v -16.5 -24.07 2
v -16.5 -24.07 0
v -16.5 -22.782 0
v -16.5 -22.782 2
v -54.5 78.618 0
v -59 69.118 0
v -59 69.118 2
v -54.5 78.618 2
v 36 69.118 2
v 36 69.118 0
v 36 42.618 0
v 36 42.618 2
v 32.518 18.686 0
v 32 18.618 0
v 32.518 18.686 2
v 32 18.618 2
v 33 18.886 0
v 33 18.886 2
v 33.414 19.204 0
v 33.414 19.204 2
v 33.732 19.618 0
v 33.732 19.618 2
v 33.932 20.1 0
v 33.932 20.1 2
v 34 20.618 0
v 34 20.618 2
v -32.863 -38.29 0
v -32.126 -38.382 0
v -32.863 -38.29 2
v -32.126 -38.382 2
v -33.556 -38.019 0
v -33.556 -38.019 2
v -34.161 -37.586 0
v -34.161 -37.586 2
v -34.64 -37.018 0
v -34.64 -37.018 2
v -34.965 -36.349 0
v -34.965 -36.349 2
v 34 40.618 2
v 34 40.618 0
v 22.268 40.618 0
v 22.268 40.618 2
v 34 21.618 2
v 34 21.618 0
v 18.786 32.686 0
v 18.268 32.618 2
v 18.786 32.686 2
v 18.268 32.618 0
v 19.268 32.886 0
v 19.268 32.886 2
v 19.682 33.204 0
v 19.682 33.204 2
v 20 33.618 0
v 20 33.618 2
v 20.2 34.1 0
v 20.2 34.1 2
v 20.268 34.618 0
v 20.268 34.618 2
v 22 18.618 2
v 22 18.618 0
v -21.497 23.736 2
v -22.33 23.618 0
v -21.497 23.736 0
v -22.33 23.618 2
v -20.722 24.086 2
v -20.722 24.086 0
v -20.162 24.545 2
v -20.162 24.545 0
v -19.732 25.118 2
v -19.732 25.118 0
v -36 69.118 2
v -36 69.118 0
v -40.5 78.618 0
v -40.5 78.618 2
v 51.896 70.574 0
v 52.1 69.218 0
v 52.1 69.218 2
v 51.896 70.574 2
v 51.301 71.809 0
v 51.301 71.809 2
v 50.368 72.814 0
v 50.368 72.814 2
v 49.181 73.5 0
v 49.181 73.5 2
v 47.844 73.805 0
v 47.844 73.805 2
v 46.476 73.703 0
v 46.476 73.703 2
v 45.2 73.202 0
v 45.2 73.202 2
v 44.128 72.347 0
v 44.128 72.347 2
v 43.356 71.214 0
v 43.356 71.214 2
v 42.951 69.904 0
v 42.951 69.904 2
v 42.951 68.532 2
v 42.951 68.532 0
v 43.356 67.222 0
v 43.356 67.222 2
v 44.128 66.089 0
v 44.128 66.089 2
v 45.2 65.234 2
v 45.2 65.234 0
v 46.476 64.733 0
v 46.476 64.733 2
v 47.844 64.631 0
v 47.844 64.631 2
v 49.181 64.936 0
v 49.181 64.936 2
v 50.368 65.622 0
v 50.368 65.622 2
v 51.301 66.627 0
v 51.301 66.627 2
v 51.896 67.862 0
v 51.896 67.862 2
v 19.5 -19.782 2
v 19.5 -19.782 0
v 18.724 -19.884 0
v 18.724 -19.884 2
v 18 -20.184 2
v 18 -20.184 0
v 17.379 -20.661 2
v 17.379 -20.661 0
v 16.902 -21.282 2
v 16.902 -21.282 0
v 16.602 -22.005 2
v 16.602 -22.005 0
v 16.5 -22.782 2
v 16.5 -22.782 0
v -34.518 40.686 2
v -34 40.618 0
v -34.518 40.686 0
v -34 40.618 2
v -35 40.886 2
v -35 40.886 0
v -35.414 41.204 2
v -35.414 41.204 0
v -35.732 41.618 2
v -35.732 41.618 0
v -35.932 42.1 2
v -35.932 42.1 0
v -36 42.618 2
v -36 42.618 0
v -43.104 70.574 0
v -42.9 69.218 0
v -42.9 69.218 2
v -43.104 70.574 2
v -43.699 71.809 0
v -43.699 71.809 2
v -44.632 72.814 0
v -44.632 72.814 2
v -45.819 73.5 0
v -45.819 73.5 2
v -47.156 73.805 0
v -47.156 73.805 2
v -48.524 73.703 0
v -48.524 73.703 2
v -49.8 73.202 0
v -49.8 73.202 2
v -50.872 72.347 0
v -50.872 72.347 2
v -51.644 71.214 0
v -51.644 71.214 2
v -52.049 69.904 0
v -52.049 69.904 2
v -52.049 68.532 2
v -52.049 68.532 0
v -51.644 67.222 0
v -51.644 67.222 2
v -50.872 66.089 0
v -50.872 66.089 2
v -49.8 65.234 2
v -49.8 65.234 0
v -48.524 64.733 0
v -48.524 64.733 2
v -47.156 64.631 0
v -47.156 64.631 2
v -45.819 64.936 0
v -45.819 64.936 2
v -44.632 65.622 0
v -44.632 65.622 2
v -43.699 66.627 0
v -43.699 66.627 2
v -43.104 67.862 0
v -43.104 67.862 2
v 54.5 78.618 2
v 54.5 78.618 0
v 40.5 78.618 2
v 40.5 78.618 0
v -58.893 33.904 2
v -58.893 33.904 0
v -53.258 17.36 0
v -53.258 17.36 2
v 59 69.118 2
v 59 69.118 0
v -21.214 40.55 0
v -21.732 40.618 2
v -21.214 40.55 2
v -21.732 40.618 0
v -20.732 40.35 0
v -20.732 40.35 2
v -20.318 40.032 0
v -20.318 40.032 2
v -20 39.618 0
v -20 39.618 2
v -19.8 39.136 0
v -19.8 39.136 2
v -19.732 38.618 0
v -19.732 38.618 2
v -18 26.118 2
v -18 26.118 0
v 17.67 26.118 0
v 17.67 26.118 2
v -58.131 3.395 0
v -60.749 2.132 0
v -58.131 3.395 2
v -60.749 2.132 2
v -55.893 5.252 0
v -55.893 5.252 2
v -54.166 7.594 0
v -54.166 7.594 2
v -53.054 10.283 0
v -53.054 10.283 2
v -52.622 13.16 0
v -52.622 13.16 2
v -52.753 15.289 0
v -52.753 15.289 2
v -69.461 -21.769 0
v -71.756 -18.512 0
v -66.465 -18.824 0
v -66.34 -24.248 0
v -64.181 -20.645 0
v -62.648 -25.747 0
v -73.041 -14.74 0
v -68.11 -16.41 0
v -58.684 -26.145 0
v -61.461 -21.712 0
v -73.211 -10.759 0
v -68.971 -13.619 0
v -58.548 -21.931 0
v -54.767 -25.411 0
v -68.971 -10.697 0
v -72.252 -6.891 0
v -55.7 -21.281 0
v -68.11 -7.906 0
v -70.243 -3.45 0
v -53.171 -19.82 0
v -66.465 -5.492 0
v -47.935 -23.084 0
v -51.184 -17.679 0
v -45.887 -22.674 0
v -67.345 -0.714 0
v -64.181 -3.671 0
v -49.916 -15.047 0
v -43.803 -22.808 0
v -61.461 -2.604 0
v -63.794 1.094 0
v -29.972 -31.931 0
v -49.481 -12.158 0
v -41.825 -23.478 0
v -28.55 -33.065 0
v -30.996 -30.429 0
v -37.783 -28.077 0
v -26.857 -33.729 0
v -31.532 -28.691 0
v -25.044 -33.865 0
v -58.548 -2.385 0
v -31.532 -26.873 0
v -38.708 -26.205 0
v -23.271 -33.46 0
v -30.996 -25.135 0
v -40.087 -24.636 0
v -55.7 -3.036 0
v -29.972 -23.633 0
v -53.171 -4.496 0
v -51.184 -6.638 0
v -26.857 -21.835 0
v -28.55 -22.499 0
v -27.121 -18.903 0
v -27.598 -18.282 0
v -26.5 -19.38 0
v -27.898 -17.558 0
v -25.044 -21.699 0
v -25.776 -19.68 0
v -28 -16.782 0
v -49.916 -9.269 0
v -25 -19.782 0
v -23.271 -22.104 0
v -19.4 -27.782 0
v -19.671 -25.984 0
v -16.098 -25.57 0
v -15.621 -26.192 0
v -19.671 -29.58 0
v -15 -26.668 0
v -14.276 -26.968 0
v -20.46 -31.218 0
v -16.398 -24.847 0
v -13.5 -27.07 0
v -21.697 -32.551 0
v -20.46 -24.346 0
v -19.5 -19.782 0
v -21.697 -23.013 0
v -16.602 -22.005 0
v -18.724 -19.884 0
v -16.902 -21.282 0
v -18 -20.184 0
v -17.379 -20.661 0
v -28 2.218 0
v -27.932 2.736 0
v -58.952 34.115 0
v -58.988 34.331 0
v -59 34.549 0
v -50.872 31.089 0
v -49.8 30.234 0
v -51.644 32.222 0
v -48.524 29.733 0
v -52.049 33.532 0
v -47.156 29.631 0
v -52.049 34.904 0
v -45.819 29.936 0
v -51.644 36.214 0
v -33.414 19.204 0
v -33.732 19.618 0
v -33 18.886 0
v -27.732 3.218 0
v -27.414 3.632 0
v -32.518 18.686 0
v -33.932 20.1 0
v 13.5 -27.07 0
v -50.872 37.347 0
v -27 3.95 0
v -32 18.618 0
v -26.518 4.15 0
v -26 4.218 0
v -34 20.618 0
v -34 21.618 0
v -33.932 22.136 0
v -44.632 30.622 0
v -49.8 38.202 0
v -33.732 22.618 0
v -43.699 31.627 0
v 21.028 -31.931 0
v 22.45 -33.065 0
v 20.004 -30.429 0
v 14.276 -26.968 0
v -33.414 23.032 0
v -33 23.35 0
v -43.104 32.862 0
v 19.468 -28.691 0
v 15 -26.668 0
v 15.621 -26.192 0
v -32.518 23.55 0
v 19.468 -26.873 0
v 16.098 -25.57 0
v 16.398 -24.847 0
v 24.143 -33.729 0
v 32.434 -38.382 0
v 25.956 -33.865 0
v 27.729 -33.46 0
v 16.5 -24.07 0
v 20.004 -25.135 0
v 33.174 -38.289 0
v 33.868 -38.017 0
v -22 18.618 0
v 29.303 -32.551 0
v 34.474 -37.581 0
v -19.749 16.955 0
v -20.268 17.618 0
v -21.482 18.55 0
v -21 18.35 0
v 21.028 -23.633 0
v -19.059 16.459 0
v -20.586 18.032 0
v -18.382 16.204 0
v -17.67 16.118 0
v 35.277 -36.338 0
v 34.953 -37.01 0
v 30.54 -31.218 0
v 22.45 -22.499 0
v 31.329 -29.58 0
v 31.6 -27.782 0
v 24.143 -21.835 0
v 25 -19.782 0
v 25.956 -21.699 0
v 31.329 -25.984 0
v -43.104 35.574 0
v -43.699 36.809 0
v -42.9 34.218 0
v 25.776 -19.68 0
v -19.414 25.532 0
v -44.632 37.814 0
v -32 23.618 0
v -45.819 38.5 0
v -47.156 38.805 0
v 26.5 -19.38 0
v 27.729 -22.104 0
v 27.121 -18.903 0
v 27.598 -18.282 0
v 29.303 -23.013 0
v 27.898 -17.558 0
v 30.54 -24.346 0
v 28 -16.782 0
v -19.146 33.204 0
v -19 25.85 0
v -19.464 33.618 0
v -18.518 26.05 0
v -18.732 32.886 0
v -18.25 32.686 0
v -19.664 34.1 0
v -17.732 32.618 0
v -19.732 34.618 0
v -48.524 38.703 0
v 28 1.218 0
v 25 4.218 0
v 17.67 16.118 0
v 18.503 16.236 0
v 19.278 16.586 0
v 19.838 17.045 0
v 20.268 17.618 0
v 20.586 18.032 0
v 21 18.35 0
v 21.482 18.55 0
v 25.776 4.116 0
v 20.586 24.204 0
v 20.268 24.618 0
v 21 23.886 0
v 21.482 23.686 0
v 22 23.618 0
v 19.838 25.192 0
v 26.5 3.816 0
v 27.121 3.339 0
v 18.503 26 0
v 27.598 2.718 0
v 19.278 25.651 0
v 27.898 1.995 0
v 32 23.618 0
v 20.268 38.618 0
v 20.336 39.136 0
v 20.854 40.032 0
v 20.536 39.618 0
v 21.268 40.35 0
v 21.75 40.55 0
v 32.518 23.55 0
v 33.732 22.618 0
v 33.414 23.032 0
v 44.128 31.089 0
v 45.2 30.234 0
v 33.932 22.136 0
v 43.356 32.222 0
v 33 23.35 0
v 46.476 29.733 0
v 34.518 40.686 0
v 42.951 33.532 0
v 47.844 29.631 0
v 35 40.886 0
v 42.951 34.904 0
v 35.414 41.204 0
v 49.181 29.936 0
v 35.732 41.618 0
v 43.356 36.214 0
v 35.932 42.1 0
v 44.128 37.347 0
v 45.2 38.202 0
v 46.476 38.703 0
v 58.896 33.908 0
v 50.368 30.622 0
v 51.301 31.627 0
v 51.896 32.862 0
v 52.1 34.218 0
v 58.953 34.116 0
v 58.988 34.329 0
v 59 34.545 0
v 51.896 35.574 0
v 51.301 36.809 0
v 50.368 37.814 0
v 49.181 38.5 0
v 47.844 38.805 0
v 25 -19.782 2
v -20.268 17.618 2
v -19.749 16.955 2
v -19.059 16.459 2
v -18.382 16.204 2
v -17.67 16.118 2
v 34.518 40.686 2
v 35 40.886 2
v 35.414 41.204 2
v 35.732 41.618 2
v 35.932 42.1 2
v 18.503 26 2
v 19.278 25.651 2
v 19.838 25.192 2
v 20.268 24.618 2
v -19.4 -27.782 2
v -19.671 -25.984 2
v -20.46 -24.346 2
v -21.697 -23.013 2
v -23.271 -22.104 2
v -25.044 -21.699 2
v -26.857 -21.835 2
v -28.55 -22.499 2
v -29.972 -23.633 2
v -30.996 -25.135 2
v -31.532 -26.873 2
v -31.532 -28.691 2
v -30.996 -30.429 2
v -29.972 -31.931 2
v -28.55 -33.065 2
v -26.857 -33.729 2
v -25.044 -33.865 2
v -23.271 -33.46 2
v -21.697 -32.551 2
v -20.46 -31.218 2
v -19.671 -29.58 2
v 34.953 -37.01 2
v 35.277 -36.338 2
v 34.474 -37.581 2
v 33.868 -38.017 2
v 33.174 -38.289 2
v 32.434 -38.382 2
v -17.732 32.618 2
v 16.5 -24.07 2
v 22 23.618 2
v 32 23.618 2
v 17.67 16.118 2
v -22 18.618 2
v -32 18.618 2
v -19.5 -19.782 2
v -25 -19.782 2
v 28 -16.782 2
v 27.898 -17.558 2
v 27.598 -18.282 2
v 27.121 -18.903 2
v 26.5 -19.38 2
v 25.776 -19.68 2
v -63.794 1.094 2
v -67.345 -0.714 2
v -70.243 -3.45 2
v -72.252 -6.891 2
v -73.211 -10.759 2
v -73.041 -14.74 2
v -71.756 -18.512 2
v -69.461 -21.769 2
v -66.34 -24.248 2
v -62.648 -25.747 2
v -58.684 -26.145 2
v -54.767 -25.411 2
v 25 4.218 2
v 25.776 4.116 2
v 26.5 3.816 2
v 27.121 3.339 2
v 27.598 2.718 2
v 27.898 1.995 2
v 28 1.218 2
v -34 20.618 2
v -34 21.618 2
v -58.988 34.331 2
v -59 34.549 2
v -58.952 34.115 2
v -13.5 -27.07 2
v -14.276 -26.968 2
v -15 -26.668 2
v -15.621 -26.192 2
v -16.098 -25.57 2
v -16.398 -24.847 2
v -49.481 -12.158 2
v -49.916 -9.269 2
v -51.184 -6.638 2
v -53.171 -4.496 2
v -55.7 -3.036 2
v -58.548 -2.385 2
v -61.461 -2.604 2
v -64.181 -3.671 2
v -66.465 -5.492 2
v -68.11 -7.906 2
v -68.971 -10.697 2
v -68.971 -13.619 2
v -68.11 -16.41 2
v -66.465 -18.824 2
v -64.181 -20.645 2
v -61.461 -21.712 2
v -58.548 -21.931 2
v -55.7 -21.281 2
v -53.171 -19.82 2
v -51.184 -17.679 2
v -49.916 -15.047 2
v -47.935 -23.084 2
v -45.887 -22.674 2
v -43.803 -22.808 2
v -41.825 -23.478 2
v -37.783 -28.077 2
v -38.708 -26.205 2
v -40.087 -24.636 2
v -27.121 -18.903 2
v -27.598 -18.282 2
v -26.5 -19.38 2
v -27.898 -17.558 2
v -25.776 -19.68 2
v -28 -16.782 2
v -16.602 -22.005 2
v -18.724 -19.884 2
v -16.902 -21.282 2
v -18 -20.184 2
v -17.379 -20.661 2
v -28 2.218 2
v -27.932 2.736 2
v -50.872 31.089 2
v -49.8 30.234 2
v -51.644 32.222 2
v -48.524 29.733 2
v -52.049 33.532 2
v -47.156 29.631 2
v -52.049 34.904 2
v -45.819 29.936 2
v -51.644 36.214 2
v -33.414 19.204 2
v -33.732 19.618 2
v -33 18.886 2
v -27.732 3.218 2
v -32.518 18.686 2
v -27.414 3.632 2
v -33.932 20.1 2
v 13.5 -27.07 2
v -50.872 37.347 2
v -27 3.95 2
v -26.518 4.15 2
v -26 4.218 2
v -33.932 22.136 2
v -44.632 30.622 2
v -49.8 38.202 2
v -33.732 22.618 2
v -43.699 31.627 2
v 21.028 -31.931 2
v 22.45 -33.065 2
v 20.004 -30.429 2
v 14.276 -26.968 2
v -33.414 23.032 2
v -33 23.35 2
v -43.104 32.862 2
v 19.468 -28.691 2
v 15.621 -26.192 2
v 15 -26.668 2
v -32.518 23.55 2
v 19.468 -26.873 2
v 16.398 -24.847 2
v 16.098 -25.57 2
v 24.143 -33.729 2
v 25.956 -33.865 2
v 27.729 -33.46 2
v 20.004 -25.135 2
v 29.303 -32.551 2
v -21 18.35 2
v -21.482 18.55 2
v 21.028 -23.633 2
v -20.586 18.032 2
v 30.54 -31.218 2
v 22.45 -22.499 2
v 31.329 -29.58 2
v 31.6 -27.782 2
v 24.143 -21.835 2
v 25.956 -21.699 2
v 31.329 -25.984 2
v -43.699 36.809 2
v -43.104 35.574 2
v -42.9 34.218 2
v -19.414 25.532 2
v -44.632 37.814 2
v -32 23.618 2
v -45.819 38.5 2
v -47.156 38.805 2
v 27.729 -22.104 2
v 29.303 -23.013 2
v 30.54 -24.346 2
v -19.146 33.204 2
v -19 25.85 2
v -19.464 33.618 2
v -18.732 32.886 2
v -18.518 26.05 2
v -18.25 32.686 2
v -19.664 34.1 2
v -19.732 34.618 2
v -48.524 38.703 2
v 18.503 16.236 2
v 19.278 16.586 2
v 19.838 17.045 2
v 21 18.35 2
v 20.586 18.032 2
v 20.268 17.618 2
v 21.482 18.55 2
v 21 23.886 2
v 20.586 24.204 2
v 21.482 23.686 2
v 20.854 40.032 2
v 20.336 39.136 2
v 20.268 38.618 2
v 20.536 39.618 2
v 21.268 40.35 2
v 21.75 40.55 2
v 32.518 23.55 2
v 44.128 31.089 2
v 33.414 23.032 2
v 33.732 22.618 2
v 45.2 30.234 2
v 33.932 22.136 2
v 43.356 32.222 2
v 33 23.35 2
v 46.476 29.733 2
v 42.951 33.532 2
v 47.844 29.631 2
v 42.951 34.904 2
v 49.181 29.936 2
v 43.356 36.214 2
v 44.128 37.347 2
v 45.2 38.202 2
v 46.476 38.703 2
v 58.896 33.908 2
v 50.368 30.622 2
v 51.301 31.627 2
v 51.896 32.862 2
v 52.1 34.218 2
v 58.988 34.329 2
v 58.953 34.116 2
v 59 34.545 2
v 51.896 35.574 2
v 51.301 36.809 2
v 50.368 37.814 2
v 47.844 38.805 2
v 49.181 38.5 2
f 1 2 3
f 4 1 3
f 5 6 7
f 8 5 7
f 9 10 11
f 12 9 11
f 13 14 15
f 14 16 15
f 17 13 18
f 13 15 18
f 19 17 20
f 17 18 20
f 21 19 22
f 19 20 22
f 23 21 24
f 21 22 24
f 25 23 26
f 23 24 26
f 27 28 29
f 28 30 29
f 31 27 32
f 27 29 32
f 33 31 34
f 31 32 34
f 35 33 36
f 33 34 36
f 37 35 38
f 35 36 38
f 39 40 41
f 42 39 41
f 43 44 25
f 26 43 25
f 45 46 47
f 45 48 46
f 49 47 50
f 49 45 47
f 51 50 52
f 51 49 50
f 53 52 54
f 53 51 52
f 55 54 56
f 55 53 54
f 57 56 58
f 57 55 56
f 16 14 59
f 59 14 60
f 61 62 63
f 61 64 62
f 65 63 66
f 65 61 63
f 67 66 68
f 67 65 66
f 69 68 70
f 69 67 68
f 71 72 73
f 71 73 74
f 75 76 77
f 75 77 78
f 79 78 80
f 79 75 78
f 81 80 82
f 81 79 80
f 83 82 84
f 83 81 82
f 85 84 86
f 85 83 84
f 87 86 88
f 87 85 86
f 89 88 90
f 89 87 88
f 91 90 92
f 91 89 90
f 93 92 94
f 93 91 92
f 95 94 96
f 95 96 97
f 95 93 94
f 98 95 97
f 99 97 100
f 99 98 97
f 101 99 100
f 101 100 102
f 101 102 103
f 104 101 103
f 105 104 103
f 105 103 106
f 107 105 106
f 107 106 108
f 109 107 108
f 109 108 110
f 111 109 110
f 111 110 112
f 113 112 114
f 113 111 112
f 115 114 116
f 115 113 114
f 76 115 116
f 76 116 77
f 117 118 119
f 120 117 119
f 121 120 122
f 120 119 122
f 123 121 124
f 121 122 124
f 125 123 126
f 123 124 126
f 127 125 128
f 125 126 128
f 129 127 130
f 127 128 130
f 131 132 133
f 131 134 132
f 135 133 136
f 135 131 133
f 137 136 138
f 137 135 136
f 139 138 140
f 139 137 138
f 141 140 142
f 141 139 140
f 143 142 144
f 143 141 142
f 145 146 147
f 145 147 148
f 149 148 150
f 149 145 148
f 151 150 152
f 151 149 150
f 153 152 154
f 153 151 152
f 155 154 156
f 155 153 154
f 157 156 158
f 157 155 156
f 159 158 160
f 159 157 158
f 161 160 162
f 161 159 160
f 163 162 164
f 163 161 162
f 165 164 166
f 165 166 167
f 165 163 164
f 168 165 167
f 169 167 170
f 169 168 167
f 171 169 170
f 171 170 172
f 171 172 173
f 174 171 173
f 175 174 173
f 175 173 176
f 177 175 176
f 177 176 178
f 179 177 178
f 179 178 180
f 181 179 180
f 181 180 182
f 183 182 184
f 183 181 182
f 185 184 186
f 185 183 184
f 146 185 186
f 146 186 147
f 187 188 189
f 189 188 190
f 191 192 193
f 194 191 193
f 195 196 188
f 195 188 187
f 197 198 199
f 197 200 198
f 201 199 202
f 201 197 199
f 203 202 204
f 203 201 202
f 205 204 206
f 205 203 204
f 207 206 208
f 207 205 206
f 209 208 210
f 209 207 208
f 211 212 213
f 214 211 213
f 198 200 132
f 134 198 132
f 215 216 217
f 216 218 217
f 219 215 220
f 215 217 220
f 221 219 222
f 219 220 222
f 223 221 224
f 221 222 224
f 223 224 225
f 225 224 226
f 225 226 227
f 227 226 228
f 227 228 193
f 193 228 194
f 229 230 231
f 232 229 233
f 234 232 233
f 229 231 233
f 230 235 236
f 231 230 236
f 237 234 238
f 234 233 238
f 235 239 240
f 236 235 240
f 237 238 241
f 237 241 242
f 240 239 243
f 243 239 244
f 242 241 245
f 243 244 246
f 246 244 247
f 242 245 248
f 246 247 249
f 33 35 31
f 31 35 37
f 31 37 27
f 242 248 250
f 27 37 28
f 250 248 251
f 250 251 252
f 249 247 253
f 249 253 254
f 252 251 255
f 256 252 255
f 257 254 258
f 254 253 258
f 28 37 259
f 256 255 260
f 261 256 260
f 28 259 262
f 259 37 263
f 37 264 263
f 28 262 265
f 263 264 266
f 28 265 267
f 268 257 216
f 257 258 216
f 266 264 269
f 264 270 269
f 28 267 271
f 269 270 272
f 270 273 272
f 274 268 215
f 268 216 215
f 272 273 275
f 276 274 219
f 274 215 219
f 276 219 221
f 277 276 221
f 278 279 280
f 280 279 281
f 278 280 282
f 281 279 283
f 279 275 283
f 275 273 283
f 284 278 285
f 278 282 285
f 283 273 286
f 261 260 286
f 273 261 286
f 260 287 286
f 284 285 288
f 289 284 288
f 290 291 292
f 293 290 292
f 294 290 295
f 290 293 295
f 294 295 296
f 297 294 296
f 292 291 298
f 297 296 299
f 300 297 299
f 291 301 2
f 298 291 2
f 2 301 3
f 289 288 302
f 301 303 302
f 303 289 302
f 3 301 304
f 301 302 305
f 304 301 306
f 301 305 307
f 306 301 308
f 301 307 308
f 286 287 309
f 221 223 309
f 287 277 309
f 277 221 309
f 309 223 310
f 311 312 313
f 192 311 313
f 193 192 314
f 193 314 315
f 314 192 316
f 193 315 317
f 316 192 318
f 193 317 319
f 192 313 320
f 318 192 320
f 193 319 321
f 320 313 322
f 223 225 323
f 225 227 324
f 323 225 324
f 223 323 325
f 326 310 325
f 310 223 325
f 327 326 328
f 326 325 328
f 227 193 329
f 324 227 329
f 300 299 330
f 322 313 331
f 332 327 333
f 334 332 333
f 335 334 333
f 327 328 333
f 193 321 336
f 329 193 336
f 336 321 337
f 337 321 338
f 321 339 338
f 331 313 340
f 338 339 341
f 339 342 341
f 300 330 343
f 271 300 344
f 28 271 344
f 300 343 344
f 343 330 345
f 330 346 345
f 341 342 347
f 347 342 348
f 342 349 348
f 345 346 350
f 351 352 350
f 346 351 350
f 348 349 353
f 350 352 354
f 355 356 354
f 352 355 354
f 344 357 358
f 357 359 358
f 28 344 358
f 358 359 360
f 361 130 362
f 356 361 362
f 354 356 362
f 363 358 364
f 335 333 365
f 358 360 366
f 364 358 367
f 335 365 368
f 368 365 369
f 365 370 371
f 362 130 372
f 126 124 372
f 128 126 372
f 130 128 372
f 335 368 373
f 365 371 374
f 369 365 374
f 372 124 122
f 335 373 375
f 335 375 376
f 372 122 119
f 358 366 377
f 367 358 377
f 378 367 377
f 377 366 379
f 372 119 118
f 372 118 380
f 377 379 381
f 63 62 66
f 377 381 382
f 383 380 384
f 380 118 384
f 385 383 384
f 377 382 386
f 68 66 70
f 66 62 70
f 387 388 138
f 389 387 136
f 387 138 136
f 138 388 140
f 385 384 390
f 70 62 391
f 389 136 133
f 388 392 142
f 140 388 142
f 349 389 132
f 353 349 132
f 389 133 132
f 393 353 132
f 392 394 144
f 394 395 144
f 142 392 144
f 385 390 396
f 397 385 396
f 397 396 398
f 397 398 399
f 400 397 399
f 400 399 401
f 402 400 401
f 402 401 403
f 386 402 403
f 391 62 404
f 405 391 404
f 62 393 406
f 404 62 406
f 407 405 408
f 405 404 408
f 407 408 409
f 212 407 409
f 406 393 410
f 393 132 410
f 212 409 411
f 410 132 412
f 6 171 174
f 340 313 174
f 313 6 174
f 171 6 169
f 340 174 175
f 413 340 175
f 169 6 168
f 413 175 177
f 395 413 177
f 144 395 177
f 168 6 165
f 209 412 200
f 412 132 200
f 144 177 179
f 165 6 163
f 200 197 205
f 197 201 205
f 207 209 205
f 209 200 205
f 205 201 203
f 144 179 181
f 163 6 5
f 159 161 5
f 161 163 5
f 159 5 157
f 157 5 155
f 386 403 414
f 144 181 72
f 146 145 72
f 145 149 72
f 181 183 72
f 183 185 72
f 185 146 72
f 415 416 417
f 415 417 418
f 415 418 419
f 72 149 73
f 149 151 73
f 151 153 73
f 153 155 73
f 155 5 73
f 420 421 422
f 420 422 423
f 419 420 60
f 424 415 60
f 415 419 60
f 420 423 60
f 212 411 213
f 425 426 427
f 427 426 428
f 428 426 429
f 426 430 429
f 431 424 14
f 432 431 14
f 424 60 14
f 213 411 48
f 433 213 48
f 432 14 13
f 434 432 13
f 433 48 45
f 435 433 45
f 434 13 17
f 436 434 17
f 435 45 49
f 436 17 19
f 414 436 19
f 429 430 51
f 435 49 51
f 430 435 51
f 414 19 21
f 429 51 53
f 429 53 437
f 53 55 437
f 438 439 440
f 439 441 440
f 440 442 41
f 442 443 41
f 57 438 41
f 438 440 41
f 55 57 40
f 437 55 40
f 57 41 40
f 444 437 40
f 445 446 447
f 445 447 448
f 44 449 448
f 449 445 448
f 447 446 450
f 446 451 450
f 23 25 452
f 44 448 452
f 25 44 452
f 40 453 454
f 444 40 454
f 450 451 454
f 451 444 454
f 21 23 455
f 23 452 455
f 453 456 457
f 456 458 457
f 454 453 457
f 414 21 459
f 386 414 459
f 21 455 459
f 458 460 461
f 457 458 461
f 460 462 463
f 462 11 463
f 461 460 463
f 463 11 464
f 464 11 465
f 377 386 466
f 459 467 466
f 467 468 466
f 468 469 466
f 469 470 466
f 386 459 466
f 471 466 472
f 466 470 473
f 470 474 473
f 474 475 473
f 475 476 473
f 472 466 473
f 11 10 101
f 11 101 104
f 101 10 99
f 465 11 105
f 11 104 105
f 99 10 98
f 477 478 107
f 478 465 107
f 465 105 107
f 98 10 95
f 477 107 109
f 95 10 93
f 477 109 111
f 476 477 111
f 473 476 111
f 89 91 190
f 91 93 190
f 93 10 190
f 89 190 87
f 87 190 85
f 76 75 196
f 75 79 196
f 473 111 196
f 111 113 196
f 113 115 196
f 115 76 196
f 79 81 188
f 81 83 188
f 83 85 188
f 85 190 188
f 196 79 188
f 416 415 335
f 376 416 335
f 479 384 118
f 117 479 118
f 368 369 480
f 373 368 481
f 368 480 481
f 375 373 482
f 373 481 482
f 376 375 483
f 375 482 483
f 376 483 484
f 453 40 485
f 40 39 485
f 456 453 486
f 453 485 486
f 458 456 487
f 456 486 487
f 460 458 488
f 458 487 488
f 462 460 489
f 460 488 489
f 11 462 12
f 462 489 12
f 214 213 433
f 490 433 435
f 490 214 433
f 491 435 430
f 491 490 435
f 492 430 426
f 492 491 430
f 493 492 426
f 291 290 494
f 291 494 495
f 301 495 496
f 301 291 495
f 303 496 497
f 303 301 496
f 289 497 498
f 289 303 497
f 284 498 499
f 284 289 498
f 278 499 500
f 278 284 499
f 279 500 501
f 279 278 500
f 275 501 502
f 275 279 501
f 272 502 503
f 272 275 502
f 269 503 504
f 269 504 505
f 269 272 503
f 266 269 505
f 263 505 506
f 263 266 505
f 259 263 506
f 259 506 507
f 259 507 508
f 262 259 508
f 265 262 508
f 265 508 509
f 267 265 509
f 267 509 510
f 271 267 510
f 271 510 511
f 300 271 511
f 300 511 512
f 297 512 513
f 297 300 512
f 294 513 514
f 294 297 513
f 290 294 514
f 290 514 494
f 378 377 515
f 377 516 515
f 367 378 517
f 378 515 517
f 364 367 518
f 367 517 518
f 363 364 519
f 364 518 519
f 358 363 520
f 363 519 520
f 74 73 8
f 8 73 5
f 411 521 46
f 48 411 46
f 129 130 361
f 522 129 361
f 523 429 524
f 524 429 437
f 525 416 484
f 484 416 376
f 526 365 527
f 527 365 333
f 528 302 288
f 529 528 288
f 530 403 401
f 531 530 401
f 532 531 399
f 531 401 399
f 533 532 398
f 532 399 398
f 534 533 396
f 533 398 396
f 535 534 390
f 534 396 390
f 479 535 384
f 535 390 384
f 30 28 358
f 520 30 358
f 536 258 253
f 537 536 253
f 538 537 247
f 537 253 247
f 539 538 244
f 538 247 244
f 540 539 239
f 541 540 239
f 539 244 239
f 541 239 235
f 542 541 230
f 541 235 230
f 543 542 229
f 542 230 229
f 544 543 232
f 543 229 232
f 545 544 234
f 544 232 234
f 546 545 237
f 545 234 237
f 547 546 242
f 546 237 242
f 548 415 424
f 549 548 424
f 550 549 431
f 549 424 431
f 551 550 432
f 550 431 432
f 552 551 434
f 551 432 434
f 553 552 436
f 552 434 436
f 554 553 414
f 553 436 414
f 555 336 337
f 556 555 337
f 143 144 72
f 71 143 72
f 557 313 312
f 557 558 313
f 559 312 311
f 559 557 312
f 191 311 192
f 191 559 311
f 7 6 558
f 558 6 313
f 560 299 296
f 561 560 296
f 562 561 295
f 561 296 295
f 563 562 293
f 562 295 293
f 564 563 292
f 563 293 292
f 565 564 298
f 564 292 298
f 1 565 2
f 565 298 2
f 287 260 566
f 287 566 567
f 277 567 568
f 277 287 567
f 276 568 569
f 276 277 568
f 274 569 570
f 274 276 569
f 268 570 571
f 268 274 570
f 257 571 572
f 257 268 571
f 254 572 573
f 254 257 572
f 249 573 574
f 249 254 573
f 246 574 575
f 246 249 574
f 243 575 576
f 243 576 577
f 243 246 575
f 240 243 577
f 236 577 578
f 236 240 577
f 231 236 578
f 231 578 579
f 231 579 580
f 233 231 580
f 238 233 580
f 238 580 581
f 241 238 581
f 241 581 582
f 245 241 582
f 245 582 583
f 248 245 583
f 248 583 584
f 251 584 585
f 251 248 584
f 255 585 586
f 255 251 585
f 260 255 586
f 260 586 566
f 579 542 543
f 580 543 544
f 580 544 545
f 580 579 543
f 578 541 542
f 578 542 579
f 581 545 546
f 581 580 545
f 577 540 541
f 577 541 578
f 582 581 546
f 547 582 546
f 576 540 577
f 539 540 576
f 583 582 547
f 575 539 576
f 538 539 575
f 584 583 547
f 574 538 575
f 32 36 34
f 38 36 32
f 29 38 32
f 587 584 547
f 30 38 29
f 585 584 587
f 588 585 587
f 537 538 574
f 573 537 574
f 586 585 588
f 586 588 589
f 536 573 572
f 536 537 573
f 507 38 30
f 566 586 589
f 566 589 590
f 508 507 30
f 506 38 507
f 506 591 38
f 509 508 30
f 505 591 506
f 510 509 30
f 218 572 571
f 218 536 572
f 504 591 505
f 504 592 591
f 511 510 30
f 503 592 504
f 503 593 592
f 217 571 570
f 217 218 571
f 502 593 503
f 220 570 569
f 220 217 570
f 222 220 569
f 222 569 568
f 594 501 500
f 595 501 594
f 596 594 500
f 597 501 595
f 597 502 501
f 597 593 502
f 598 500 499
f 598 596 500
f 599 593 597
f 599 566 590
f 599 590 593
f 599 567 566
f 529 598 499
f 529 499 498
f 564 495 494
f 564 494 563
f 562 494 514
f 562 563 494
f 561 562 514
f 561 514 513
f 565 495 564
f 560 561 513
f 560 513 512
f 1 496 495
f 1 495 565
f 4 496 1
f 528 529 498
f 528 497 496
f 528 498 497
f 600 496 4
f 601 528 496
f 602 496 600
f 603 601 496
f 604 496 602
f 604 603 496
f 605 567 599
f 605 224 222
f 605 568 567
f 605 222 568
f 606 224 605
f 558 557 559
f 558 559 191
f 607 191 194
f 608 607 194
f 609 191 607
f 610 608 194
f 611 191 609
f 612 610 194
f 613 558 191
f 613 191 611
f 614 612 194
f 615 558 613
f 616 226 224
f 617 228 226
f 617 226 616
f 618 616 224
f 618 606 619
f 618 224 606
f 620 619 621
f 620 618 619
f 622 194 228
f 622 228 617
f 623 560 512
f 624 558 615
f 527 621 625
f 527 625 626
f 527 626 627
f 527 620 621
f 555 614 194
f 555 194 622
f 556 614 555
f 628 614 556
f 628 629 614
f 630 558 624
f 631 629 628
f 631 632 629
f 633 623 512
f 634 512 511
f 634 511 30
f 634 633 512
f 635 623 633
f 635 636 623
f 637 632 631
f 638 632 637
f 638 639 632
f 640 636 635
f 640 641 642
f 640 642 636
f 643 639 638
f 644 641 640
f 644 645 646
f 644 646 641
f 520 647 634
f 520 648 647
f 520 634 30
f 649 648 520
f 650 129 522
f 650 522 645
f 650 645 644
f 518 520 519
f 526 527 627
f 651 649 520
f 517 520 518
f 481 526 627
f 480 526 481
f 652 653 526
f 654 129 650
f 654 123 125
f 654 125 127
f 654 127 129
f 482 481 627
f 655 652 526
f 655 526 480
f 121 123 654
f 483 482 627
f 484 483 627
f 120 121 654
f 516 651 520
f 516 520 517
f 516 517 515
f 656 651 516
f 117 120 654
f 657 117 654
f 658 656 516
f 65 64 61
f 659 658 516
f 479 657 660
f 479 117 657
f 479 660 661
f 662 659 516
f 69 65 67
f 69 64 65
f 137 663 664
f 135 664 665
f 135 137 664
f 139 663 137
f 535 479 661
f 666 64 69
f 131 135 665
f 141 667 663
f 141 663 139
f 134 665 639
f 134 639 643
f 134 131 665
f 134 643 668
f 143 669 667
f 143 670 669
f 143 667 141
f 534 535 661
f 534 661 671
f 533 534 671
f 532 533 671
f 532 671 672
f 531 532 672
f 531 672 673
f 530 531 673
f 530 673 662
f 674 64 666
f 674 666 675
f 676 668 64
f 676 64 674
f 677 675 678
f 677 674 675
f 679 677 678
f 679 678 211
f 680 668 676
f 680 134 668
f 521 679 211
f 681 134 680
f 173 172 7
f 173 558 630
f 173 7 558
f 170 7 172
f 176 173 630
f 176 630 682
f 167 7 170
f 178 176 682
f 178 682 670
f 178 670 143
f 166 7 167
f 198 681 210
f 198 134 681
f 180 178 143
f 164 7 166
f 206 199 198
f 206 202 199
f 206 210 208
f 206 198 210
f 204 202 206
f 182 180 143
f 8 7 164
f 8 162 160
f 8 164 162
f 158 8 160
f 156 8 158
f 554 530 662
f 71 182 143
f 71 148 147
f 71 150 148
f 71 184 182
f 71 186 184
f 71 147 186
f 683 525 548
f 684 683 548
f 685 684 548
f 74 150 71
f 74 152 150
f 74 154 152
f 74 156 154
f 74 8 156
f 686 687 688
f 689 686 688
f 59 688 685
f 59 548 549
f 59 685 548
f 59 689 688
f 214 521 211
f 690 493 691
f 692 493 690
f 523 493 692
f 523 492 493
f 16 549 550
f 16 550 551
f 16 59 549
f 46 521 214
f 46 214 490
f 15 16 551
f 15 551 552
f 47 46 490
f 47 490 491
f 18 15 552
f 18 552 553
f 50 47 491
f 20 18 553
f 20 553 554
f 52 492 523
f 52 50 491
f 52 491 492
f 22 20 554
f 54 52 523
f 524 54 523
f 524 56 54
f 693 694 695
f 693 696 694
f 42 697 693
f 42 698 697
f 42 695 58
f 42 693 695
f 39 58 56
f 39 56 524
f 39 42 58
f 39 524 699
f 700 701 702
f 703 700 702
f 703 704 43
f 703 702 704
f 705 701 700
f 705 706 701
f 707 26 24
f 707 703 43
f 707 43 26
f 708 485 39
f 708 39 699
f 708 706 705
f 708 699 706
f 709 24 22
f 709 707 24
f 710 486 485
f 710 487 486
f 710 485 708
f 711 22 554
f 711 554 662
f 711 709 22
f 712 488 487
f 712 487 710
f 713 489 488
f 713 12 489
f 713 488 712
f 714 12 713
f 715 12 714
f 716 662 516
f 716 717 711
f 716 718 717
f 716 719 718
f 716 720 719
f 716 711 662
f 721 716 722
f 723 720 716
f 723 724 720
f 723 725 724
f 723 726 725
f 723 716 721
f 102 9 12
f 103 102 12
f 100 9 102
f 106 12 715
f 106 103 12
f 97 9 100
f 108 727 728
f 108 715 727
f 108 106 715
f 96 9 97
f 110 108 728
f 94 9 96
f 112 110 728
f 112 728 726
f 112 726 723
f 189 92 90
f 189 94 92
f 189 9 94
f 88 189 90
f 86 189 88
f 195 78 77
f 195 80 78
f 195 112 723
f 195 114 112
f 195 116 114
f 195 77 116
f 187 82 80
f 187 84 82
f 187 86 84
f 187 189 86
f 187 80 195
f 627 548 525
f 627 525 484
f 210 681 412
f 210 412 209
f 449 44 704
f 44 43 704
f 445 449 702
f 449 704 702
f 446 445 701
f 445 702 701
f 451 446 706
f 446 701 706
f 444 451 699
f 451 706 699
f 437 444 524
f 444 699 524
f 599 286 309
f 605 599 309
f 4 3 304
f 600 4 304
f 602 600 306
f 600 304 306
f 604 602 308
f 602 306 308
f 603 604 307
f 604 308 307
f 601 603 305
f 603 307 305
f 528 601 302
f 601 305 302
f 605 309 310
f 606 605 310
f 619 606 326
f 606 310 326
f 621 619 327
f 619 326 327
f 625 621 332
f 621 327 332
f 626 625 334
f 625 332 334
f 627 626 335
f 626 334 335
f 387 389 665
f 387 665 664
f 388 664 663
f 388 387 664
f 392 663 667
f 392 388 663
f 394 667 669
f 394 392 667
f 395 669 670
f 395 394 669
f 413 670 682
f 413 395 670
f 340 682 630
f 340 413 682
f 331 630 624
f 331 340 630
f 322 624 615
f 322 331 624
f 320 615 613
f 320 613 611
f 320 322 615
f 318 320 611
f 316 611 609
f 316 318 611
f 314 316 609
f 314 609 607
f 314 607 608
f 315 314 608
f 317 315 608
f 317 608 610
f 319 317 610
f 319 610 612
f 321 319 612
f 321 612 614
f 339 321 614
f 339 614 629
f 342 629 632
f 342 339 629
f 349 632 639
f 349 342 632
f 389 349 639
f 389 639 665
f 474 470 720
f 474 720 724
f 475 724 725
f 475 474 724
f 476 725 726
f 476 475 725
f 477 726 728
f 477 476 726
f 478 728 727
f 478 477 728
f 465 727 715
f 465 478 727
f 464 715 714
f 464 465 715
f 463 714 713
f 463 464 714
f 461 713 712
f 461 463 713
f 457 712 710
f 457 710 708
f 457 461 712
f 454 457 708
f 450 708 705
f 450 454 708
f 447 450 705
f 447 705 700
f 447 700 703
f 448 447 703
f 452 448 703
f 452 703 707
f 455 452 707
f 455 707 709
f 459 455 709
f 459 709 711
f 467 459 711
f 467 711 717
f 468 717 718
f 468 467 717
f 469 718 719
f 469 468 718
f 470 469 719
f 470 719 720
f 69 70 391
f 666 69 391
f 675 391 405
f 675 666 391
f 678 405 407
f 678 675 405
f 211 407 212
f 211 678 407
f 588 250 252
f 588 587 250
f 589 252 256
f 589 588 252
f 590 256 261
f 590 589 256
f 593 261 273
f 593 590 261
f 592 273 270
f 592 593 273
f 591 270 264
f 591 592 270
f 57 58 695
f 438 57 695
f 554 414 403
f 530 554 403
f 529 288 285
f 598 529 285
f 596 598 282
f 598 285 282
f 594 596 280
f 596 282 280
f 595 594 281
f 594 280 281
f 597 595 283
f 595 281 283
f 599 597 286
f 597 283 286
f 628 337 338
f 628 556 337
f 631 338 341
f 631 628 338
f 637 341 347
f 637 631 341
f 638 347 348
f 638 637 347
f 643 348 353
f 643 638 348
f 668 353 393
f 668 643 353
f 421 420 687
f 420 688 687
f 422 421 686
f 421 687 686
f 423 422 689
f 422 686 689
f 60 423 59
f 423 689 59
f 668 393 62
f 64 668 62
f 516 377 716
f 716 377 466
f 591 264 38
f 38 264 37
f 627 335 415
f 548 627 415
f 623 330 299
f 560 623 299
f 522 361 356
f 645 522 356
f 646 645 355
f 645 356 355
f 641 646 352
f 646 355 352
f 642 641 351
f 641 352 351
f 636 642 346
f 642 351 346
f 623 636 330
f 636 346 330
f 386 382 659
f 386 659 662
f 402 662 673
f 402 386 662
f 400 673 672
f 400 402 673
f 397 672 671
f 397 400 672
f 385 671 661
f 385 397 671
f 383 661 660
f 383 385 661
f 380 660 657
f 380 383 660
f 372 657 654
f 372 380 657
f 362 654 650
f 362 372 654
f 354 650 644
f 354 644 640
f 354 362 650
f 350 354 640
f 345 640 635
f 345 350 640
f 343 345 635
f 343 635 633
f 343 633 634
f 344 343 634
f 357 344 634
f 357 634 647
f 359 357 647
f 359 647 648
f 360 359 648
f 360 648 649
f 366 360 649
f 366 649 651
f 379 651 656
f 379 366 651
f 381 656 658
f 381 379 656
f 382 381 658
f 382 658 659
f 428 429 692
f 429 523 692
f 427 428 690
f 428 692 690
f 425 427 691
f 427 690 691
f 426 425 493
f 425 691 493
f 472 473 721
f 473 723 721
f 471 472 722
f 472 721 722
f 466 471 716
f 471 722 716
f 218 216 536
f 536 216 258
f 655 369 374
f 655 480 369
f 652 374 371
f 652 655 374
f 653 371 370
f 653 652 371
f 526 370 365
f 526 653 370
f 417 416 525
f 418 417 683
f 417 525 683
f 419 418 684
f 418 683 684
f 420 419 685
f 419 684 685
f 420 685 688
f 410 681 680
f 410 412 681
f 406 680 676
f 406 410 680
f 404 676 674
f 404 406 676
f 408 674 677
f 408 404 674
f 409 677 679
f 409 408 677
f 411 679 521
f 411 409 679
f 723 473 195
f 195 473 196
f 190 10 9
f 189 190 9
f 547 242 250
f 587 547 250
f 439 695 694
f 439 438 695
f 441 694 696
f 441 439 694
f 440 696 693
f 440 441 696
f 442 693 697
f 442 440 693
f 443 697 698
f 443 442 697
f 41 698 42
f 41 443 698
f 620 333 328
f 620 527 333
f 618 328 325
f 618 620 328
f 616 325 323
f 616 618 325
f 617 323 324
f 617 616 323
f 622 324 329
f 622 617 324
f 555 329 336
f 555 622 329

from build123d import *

# Parameters (mm, degrees)
F0_R        = 9.8
F0_R_2      = 6.1
F0_R_3      = 4.6
F1_DEPTH    = 2
F2_R        = 2
F3_R        = 3
F4_W        = 40
F4_H        = 8
F5_DEPTH    = 25
F6_R        = 2
F7_R        = 8
F8_R        = 12
F9_C1_SIZE2 = 4.5
F9_C1_SIZE  = 9.5
F9_C2_SIZE2 = 9.5
F9_C2_SIZE  = 4.5
F9_C3_SIZE2 = 9.5
F9_C3_SIZE  = 4.5
F9_C4_SIZE2 = 9.5
F9_C4_SIZE  = 4.5


# Not quite as in the source:
# - two fillets or chamfers of one size are made in one step


with BuildPart() as f1:
    # F0 (on Top) → F1 (new body)
    with BuildSketch(Plane.XY):
        with BuildLine():
            Line((36, 40.6180607378), (-36, 40.6180607378))
            Line((-36, 40.6180607378), (-36, 78.6180607378))
            Line((-36, 78.6180607378), (-59, 78.6180607378))
            Line((-59, 78.6180607378), (-59, 40.6180607378))
            Line((-59, 40.6180607378), (-59, 34.2180607378))
            Line((-59, 34.2180607378), (-52.466149277, 15.0342559872))
            Line((-52.466149277, 15.0342559872), (-49.3893506198, 6.000577809))
            Line((-49.3893506198, 6.000577809), (-63.7943902368, 1.0943363339))
            ThreePointArc((-63.7943902368, 1.0943363339), (-72.5331453979, -16.6717594171), (-54.7670496468, -25.4105145782))
            Line((-54.7670496468, -25.4105145782), (-40.3620100298, -20.5042731031))
            Line((-40.3620100298, -20.5042731031), (-34.2730196821, -38.3819392622))
            Line((-34.2730196821, -38.3819392622), (34.5899127424, -38.3819392622))
            Line((34.5899127424, -38.3819392622), (59, 34.2180607378))
            Line((59, 34.2180607378), (59, 40.6180607378))
            Line((59, 40.6180607378), (59, 78.6180607378))
            Line((59, 78.6180607378), (36, 78.6180607378))
            Line((36, 78.6180607378), (36, 40.6180607378))
        make_face()
        with Locations((-59.2807199418, -12.1580891221)):
            Circle(F0_R, mode=Mode.SUBTRACT)
        with Locations((-25.5, -27.7819392622)):
            Circle(F0_R_2, mode=Mode.SUBTRACT)
        with Locations((25.5, -27.7819392622)):
            Circle(F0_R_2, mode=Mode.SUBTRACT)
        with BuildLine():
            ThreePointArc((-28, 2.2180607378), (-27.4142135624, 3.6322743002), (-26, 4.2180607378))
            Line((-26, 4.2180607378), (25, 4.2180607378))
            ThreePointArc((25, 4.2180607378), (27.1213203436, 3.3393810814), (28, 1.2180607378))
            Line((28, 1.2180607378), (28, -16.7819392622))
            ThreePointArc((28, -16.7819392622), (27.1213203436, -18.9032596057), (25, -19.7819392622))
            Line((25, -19.7819392622), (19.5, -19.7819392622))
            ThreePointArc((19.5, -19.7819392622), (17.3786796564, -20.6606189186), (16.5, -22.7819392622))
            Line((16.5, -22.7819392622), (16.5, -24.0702618733))
            ThreePointArc((16.5, -24.0702618733), (15.6213203436, -26.1915822169), (13.5, -27.0702618733))
            Line((13.5, -27.0702618733), (-13.5, -27.0702618733))
            ThreePointArc((-13.5, -27.0702618733), (-15.6213203436, -26.1915822169), (-16.5, -24.0702618733))
            Line((-16.5, -24.0702618733), (-16.5, -22.7819392622))
            ThreePointArc((-16.5, -22.7819392622), (-17.3786796564, -20.6606189186), (-19.5, -19.7819392622))
            Line((-19.5, -19.7819392622), (-25, -19.7819392622))
            ThreePointArc((-25, -19.7819392622), (-27.1213203436, -18.9032596057), (-28, -16.7819392622))
            Line((-28, -16.7819392622), (-28, 2.2180607378))
        make_face(mode=Mode.SUBTRACT)
        with Locations((-47.5, 34.2180607378)):
            Circle(F0_R_3, mode=Mode.SUBTRACT)
        with Locations((-47.5, 69.2180607378)):
            Circle(F0_R_3, mode=Mode.SUBTRACT)
        Polygon((-20, 18.6180607378), (-34, 18.6180607378), (-34, 23.6180607378), (-20, 23.6180607378), (-20, 26.1180607378), (20, 26.1180607378), (20, 23.6180607378), (34, 23.6180607378), (34, 18.6180607378), (20, 18.6180607378), (20, 16.1180607378), (-20, 16.1180607378), align=None, mode=Mode.SUBTRACT)
        with Locations((47.5, 34.2180607378)):
            Circle(F0_R_3, mode=Mode.SUBTRACT)
        with Locations((47.5, 69.2180607378)):
            Circle(F0_R_3, mode=Mode.SUBTRACT)
    extrude(amount=F1_DEPTH)

    # F2
    f2_edges = [f1.edges().sort_by_distance(p)[0] for p in [
        (59, 34.218061, 1),
        (-20, 26.118061, 1),
        (20, 23.618061, 1),
        (-34, 23.618061, 1),
        (-20, 18.618061, 1),
        (-34, 18.618061, 1),
        (20, 18.618061, 1),
        (34, 23.618061, 1),
        (34, 18.618061, 1),
        (-59, 34.218061, 1),
        (-36, 40.618061, 1),
        (36, 40.618061, 1),
    ]]
    fillet(f2_edges, radius=F2_R)

    # F3
    f3_edges = [f1.edges().sort_by_distance(p)[0] for p in [
        (-20, 23.618061, 1),
        (-20, 16.118061, 1),
        (20, 26.118061, 1),
        (20, 16.118061, 1),
        (-34.27302, -38.381939, 1),
        (34.589913, -38.381939, 1),
    ]]
    fillet(f3_edges, radius=F3_R)

    # F4 (on face) → F5 (cut)
    with BuildSketch(Plane.XY.offset(2)):
        with Locations((0.2679491924, 36.6180607378)):
            Rectangle(F4_W, F4_H)
    extrude(amount=-F5_DEPTH, mode=Mode.SUBTRACT)

    # F6
    f6_edges = [f1.edges().sort_by_distance(p)[0] for p in [
        (-19.732051, 40.618061, 1),
        (-19.732051, 32.618061, 1),
        (20.267949, 40.618061, 1),
        (20.267949, 32.618061, 1),
    ]]
    fillet(f6_edges, radius=F6_R)

    # F7
    f7_edges = [f1.edges().sort_by_distance(p)[0] for p in [
        (-40.36201, -20.504273, 1),
    ]]
    fillet(f7_edges, radius=F7_R)

    # F8
    f8_edges = [f1.edges().sort_by_distance(p)[0] for p in [
        (-49.389351, 6.000578, 1),
    ]]
    fillet(f8_edges, radius=F8_R)

    # F9: chamfer of 9.5 x 4.5 on 4 edges, made by hand

    # F9_c1
    f9_c1_edges = [f1.edges().sort_by_distance(p)[0] for p in [
        (-59, 78.6180607378, 1),
    ]]
    f9_c1_side = f1.faces().sort_by_distance((-59, 78.5280607378, 1))[0]
    chamfer(f9_c1_edges, length=F9_C1_SIZE, length2=F9_C1_SIZE2, reference=f9_c1_side)

    # F9_c2
    f9_c2_edges = [f1.edges().sort_by_distance(p)[0] for p in [
        (-36, 78.6180607378, 1),
    ]]
    f9_c2_side = f1.faces().sort_by_distance((-36.09, 78.6180607378, 1))[0]
    chamfer(f9_c2_edges, length=F9_C2_SIZE, length2=F9_C2_SIZE2, reference=f9_c2_side)

    # F9_c3
    f9_c3_edges = [f1.edges().sort_by_distance(p)[0] for p in [
        (59, 78.6180607378, 1),
    ]]
    f9_c3_side = f1.faces().sort_by_distance((58.91, 78.6180607378, 1))[0]
    chamfer(f9_c3_edges, length=F9_C3_SIZE, length2=F9_C3_SIZE2, reference=f9_c3_side)

    # F9_c4
    f9_c4_edges = [f1.edges().sort_by_distance(p)[0] for p in [
        (36, 78.6180607378, 1),
    ]]
    f9_c4_side = f1.faces().sort_by_distance((36.09, 78.6180607378, 1))[0]
    chamfer(f9_c4_edges, length=F9_C4_SIZE, length2=F9_C4_SIZE2, reference=f9_c4_side)


solid = f1.part
